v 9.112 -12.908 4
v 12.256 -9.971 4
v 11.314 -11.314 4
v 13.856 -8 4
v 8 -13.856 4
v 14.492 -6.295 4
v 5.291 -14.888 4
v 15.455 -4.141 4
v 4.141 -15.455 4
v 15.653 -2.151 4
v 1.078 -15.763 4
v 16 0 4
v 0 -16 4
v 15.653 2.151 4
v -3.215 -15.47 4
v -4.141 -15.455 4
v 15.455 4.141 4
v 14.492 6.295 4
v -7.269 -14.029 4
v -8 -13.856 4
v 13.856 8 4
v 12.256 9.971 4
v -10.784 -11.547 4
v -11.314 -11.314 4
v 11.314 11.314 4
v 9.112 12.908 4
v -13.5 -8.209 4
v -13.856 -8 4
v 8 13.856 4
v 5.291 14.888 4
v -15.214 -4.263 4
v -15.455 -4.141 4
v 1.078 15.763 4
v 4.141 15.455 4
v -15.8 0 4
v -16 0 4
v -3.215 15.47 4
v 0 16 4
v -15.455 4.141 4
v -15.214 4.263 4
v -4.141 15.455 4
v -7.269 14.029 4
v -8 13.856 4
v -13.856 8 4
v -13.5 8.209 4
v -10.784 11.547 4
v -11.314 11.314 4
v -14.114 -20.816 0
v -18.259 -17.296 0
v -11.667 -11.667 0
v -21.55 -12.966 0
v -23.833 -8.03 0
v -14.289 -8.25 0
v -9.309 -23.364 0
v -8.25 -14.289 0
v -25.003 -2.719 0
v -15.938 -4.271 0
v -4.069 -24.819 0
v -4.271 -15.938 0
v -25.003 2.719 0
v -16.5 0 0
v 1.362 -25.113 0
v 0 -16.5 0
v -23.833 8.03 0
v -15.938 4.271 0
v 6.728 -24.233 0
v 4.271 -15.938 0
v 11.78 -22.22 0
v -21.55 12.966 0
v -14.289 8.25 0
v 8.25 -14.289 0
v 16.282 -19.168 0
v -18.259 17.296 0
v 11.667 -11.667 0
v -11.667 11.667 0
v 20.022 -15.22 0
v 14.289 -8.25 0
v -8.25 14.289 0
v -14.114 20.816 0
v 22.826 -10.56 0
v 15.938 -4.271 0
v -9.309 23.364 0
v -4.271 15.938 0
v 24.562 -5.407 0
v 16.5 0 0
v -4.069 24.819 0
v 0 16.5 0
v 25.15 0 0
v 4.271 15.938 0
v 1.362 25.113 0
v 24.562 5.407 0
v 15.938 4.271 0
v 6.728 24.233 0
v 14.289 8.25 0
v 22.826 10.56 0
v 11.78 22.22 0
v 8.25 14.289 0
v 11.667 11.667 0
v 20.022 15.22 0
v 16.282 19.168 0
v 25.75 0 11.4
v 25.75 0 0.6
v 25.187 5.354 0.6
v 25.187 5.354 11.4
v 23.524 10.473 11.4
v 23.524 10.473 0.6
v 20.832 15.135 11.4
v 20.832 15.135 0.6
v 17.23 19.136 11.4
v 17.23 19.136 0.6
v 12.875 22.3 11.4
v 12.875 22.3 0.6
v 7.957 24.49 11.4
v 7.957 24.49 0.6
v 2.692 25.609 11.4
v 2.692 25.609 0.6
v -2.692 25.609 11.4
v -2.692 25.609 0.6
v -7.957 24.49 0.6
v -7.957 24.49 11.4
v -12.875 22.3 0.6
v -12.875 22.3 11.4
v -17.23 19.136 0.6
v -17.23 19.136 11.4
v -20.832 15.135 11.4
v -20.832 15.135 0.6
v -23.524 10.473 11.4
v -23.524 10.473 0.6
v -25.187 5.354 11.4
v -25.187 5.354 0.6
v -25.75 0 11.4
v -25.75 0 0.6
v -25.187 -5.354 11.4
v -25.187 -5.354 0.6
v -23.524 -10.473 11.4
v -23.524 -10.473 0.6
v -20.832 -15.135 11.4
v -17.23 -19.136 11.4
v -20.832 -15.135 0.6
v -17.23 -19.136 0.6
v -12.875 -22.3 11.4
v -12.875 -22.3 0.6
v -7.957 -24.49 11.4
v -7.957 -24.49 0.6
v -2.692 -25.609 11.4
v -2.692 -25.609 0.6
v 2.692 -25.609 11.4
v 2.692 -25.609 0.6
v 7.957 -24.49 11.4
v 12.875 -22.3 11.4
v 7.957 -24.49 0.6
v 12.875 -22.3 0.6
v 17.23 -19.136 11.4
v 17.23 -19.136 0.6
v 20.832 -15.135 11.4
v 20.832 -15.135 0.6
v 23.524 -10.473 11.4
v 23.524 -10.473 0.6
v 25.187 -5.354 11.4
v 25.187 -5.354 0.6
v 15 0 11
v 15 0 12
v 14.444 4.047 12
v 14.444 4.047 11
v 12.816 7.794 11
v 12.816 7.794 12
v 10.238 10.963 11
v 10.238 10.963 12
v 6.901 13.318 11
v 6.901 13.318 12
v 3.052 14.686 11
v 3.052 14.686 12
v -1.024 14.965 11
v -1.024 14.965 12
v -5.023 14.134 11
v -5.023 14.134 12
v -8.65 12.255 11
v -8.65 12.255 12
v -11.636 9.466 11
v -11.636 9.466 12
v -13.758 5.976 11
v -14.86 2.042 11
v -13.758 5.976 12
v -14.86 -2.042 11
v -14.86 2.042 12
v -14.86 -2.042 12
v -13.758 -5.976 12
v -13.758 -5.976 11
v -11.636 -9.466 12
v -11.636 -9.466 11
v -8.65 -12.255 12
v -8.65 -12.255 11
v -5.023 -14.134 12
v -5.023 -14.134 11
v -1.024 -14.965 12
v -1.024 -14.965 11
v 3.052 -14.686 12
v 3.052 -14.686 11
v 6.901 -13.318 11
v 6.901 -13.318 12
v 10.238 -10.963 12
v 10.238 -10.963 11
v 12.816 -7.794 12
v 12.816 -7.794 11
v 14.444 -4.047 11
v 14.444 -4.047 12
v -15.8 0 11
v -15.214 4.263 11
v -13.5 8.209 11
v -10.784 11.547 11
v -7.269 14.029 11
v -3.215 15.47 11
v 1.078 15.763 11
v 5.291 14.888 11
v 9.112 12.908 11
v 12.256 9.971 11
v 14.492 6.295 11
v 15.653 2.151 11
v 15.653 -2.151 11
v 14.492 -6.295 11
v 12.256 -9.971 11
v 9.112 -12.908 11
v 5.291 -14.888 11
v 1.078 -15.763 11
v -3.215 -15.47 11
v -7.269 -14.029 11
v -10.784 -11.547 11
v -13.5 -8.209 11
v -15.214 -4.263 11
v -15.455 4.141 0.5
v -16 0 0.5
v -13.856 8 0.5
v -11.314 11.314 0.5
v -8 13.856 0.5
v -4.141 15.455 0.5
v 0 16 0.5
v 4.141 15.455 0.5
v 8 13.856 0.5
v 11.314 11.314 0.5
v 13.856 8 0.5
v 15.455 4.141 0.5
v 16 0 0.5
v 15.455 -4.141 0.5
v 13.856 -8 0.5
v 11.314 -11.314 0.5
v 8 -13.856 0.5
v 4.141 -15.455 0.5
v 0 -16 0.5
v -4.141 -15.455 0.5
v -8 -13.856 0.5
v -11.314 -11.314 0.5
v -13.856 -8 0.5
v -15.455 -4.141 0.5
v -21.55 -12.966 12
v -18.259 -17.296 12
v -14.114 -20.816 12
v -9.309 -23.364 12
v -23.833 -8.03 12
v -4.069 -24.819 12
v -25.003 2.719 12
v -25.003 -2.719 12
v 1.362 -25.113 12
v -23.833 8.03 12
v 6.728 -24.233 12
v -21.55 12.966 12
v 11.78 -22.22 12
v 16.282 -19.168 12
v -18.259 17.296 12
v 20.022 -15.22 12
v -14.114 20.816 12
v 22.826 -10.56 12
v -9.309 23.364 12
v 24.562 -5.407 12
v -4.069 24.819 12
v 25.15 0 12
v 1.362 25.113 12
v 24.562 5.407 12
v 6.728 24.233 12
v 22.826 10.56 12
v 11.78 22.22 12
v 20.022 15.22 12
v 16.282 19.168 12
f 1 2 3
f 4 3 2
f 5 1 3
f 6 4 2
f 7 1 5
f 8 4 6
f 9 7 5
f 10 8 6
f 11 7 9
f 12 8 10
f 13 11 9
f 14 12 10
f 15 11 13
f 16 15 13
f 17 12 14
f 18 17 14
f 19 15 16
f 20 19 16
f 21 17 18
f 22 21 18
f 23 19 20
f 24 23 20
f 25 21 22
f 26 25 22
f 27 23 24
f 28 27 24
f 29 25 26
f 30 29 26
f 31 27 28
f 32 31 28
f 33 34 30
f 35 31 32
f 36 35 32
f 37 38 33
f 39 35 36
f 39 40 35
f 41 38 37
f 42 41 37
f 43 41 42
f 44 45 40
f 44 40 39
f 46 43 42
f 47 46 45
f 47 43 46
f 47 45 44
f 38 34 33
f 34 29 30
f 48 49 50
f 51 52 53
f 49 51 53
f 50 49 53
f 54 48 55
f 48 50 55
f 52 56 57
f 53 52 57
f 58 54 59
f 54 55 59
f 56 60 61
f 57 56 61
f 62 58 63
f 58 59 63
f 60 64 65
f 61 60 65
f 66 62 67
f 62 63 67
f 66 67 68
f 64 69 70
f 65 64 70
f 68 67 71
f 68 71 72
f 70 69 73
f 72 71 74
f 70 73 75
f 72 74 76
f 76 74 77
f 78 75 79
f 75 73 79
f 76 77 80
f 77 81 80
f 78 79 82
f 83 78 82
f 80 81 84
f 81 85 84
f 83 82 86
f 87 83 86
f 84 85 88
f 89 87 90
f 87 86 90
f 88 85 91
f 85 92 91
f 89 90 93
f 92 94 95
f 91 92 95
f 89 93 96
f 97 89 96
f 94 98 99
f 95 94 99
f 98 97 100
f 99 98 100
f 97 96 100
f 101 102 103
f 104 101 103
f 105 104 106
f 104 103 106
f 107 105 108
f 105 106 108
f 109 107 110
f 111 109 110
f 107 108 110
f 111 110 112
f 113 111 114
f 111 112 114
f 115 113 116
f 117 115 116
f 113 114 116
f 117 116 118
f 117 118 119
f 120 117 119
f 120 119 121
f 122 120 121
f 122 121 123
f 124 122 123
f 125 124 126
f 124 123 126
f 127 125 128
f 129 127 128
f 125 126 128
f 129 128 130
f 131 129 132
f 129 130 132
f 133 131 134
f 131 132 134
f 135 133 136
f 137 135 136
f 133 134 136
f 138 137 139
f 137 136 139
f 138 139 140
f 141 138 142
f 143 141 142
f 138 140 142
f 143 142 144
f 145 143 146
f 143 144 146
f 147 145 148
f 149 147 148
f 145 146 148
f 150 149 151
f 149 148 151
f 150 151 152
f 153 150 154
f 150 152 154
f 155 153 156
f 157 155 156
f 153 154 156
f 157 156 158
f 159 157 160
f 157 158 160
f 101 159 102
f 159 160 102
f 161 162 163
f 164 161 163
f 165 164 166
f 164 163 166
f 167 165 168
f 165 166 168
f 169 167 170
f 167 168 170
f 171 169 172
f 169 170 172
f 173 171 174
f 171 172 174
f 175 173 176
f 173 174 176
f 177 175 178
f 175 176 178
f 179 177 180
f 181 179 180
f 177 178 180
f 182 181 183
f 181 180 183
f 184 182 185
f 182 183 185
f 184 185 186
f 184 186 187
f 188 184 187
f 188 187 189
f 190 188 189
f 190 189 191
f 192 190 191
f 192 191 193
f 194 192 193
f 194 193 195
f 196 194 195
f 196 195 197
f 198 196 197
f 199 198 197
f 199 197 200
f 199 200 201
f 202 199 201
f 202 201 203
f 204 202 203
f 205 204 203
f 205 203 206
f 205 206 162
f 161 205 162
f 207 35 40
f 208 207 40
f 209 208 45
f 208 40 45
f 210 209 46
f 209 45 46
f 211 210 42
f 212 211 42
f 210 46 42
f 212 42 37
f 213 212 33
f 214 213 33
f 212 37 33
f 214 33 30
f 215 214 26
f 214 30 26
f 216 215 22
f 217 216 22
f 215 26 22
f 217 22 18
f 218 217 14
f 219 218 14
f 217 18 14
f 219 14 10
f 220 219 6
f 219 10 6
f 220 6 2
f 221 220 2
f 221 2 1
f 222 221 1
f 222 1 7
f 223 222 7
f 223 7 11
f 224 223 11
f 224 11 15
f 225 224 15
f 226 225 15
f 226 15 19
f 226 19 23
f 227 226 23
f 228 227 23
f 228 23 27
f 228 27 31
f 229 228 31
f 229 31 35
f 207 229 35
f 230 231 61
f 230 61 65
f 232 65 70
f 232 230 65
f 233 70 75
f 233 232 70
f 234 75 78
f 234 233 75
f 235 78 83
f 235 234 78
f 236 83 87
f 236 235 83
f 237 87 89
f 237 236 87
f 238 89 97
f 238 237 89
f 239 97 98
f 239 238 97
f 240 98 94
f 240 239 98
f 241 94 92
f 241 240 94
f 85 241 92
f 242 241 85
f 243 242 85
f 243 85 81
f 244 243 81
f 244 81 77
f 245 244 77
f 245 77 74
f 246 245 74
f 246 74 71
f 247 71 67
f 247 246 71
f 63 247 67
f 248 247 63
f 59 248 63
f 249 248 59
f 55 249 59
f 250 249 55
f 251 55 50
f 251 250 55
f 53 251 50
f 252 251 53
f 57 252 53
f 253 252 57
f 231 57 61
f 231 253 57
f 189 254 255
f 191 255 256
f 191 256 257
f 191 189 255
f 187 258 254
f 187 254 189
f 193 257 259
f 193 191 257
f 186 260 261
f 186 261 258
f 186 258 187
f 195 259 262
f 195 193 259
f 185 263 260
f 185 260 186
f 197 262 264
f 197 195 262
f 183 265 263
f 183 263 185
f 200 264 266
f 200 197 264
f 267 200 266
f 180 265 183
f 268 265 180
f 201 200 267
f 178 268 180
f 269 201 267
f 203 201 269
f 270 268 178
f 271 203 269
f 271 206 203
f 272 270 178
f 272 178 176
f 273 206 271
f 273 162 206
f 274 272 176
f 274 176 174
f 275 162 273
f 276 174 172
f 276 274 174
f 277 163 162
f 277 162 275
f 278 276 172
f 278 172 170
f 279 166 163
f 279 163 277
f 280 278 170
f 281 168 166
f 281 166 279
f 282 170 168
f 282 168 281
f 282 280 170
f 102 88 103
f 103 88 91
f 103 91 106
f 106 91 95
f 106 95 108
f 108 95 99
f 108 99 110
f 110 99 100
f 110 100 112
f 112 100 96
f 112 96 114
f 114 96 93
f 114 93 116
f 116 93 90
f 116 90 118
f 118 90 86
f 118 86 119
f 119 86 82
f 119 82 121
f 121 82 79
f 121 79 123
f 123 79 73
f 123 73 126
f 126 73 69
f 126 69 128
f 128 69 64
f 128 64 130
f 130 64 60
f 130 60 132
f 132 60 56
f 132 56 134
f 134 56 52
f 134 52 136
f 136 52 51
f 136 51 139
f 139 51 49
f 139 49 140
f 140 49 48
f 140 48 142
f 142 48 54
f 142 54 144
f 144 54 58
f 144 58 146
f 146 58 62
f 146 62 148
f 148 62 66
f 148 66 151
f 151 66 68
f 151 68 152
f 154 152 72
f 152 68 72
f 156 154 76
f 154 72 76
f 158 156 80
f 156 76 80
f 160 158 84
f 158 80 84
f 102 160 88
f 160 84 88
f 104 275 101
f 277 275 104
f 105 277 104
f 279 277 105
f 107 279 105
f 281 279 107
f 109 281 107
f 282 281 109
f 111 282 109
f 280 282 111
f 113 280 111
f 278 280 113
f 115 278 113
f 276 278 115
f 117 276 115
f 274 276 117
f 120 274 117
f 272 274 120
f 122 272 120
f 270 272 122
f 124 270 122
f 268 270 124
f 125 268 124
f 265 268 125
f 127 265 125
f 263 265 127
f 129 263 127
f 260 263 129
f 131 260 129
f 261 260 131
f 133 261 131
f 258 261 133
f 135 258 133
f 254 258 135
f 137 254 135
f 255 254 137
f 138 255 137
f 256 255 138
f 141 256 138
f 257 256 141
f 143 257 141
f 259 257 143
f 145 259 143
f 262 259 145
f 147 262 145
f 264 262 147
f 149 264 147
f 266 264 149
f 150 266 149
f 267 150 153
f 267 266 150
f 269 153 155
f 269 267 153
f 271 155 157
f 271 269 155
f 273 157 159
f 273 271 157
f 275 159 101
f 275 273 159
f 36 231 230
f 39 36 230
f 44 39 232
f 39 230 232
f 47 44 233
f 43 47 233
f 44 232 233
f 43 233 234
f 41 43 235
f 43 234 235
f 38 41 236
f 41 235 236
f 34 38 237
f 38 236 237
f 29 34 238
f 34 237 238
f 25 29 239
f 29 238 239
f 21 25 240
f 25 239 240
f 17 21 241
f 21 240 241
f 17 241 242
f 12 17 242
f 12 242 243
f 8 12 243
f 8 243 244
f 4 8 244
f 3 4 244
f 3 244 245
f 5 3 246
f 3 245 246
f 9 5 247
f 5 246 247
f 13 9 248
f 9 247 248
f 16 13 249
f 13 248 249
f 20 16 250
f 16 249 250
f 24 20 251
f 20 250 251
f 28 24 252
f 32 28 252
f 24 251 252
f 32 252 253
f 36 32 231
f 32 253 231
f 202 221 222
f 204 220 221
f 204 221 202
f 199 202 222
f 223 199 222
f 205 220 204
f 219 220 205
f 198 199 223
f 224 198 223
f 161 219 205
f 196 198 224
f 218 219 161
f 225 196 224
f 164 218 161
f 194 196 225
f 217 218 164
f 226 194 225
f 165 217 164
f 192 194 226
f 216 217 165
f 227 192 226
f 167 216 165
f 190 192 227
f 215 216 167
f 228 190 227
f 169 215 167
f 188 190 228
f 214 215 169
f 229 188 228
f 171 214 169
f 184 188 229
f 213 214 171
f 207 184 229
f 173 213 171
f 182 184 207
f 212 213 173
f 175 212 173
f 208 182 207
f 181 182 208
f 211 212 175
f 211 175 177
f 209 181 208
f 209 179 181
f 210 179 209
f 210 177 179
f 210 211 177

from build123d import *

# Parameters (mm, degrees)
SKETCH1_R           = 25.75
BOSS_EXTRUDE1_DEPTH = 12
CHAMFER1_SIZE       = 0.6
SKETCH2_R           = 15
CUT_EXTRUDE1_DEPTH  = 13
SKETCH3_R           = 15.8
CUT_EXTRUDE2_DEPTH  = 11
SKETCH4_R           = 16
CUT_EXTRUDE3_DEPTH  = 4
CHAMFER2_SIZE       = 0.5


with BuildPart() as part:
    # Sketch1 → Boss-Extrude1 (new body)
    with BuildSketch(Plane.XY):
        Circle(SKETCH1_R)
    extrude(amount=BOSS_EXTRUDE1_DEPTH)

    # Chamfer1
    chamfer1_edges = [part.edges().sort_by_distance(p)[0] for p in [
        (-25.75, 0, 0),
        (-25.75, 0, 12),
    ]]
    chamfer(chamfer1_edges, length=CHAMFER1_SIZE)

    # Sketch2 → Cut-Extrude1 (cut, through all)
    with BuildSketch(Plane.XY.offset(12)):
        Circle(SKETCH2_R)
    extrude(amount=-CUT_EXTRUDE1_DEPTH, mode=Mode.SUBTRACT)

    # Sketch3 → Cut-Extrude2 (cut)
    with BuildSketch(Plane(origin=(0, 0, 0), x_dir=(-1, 0, 0), z_dir=(0, 0, -1))):
        Circle(SKETCH3_R)
    extrude(amount=-CUT_EXTRUDE2_DEPTH, mode=Mode.SUBTRACT)

    # Sketch4 → Cut-Extrude3 (cut)
    with BuildSketch(Plane(origin=(0, 0, 0), x_dir=(-1, 0, 0), z_dir=(0, 0, -1))):
        Circle(SKETCH4_R)
    extrude(amount=-CUT_EXTRUDE3_DEPTH, mode=Mode.SUBTRACT)

    # Chamfer2
    chamfer2_edges = [part.edges().sort_by_distance(p)[0] for p in [
        (16, 0, 0),
    ]]
    chamfer(chamfer2_edges, length=CHAMFER2_SIZE)


solid = part.part
